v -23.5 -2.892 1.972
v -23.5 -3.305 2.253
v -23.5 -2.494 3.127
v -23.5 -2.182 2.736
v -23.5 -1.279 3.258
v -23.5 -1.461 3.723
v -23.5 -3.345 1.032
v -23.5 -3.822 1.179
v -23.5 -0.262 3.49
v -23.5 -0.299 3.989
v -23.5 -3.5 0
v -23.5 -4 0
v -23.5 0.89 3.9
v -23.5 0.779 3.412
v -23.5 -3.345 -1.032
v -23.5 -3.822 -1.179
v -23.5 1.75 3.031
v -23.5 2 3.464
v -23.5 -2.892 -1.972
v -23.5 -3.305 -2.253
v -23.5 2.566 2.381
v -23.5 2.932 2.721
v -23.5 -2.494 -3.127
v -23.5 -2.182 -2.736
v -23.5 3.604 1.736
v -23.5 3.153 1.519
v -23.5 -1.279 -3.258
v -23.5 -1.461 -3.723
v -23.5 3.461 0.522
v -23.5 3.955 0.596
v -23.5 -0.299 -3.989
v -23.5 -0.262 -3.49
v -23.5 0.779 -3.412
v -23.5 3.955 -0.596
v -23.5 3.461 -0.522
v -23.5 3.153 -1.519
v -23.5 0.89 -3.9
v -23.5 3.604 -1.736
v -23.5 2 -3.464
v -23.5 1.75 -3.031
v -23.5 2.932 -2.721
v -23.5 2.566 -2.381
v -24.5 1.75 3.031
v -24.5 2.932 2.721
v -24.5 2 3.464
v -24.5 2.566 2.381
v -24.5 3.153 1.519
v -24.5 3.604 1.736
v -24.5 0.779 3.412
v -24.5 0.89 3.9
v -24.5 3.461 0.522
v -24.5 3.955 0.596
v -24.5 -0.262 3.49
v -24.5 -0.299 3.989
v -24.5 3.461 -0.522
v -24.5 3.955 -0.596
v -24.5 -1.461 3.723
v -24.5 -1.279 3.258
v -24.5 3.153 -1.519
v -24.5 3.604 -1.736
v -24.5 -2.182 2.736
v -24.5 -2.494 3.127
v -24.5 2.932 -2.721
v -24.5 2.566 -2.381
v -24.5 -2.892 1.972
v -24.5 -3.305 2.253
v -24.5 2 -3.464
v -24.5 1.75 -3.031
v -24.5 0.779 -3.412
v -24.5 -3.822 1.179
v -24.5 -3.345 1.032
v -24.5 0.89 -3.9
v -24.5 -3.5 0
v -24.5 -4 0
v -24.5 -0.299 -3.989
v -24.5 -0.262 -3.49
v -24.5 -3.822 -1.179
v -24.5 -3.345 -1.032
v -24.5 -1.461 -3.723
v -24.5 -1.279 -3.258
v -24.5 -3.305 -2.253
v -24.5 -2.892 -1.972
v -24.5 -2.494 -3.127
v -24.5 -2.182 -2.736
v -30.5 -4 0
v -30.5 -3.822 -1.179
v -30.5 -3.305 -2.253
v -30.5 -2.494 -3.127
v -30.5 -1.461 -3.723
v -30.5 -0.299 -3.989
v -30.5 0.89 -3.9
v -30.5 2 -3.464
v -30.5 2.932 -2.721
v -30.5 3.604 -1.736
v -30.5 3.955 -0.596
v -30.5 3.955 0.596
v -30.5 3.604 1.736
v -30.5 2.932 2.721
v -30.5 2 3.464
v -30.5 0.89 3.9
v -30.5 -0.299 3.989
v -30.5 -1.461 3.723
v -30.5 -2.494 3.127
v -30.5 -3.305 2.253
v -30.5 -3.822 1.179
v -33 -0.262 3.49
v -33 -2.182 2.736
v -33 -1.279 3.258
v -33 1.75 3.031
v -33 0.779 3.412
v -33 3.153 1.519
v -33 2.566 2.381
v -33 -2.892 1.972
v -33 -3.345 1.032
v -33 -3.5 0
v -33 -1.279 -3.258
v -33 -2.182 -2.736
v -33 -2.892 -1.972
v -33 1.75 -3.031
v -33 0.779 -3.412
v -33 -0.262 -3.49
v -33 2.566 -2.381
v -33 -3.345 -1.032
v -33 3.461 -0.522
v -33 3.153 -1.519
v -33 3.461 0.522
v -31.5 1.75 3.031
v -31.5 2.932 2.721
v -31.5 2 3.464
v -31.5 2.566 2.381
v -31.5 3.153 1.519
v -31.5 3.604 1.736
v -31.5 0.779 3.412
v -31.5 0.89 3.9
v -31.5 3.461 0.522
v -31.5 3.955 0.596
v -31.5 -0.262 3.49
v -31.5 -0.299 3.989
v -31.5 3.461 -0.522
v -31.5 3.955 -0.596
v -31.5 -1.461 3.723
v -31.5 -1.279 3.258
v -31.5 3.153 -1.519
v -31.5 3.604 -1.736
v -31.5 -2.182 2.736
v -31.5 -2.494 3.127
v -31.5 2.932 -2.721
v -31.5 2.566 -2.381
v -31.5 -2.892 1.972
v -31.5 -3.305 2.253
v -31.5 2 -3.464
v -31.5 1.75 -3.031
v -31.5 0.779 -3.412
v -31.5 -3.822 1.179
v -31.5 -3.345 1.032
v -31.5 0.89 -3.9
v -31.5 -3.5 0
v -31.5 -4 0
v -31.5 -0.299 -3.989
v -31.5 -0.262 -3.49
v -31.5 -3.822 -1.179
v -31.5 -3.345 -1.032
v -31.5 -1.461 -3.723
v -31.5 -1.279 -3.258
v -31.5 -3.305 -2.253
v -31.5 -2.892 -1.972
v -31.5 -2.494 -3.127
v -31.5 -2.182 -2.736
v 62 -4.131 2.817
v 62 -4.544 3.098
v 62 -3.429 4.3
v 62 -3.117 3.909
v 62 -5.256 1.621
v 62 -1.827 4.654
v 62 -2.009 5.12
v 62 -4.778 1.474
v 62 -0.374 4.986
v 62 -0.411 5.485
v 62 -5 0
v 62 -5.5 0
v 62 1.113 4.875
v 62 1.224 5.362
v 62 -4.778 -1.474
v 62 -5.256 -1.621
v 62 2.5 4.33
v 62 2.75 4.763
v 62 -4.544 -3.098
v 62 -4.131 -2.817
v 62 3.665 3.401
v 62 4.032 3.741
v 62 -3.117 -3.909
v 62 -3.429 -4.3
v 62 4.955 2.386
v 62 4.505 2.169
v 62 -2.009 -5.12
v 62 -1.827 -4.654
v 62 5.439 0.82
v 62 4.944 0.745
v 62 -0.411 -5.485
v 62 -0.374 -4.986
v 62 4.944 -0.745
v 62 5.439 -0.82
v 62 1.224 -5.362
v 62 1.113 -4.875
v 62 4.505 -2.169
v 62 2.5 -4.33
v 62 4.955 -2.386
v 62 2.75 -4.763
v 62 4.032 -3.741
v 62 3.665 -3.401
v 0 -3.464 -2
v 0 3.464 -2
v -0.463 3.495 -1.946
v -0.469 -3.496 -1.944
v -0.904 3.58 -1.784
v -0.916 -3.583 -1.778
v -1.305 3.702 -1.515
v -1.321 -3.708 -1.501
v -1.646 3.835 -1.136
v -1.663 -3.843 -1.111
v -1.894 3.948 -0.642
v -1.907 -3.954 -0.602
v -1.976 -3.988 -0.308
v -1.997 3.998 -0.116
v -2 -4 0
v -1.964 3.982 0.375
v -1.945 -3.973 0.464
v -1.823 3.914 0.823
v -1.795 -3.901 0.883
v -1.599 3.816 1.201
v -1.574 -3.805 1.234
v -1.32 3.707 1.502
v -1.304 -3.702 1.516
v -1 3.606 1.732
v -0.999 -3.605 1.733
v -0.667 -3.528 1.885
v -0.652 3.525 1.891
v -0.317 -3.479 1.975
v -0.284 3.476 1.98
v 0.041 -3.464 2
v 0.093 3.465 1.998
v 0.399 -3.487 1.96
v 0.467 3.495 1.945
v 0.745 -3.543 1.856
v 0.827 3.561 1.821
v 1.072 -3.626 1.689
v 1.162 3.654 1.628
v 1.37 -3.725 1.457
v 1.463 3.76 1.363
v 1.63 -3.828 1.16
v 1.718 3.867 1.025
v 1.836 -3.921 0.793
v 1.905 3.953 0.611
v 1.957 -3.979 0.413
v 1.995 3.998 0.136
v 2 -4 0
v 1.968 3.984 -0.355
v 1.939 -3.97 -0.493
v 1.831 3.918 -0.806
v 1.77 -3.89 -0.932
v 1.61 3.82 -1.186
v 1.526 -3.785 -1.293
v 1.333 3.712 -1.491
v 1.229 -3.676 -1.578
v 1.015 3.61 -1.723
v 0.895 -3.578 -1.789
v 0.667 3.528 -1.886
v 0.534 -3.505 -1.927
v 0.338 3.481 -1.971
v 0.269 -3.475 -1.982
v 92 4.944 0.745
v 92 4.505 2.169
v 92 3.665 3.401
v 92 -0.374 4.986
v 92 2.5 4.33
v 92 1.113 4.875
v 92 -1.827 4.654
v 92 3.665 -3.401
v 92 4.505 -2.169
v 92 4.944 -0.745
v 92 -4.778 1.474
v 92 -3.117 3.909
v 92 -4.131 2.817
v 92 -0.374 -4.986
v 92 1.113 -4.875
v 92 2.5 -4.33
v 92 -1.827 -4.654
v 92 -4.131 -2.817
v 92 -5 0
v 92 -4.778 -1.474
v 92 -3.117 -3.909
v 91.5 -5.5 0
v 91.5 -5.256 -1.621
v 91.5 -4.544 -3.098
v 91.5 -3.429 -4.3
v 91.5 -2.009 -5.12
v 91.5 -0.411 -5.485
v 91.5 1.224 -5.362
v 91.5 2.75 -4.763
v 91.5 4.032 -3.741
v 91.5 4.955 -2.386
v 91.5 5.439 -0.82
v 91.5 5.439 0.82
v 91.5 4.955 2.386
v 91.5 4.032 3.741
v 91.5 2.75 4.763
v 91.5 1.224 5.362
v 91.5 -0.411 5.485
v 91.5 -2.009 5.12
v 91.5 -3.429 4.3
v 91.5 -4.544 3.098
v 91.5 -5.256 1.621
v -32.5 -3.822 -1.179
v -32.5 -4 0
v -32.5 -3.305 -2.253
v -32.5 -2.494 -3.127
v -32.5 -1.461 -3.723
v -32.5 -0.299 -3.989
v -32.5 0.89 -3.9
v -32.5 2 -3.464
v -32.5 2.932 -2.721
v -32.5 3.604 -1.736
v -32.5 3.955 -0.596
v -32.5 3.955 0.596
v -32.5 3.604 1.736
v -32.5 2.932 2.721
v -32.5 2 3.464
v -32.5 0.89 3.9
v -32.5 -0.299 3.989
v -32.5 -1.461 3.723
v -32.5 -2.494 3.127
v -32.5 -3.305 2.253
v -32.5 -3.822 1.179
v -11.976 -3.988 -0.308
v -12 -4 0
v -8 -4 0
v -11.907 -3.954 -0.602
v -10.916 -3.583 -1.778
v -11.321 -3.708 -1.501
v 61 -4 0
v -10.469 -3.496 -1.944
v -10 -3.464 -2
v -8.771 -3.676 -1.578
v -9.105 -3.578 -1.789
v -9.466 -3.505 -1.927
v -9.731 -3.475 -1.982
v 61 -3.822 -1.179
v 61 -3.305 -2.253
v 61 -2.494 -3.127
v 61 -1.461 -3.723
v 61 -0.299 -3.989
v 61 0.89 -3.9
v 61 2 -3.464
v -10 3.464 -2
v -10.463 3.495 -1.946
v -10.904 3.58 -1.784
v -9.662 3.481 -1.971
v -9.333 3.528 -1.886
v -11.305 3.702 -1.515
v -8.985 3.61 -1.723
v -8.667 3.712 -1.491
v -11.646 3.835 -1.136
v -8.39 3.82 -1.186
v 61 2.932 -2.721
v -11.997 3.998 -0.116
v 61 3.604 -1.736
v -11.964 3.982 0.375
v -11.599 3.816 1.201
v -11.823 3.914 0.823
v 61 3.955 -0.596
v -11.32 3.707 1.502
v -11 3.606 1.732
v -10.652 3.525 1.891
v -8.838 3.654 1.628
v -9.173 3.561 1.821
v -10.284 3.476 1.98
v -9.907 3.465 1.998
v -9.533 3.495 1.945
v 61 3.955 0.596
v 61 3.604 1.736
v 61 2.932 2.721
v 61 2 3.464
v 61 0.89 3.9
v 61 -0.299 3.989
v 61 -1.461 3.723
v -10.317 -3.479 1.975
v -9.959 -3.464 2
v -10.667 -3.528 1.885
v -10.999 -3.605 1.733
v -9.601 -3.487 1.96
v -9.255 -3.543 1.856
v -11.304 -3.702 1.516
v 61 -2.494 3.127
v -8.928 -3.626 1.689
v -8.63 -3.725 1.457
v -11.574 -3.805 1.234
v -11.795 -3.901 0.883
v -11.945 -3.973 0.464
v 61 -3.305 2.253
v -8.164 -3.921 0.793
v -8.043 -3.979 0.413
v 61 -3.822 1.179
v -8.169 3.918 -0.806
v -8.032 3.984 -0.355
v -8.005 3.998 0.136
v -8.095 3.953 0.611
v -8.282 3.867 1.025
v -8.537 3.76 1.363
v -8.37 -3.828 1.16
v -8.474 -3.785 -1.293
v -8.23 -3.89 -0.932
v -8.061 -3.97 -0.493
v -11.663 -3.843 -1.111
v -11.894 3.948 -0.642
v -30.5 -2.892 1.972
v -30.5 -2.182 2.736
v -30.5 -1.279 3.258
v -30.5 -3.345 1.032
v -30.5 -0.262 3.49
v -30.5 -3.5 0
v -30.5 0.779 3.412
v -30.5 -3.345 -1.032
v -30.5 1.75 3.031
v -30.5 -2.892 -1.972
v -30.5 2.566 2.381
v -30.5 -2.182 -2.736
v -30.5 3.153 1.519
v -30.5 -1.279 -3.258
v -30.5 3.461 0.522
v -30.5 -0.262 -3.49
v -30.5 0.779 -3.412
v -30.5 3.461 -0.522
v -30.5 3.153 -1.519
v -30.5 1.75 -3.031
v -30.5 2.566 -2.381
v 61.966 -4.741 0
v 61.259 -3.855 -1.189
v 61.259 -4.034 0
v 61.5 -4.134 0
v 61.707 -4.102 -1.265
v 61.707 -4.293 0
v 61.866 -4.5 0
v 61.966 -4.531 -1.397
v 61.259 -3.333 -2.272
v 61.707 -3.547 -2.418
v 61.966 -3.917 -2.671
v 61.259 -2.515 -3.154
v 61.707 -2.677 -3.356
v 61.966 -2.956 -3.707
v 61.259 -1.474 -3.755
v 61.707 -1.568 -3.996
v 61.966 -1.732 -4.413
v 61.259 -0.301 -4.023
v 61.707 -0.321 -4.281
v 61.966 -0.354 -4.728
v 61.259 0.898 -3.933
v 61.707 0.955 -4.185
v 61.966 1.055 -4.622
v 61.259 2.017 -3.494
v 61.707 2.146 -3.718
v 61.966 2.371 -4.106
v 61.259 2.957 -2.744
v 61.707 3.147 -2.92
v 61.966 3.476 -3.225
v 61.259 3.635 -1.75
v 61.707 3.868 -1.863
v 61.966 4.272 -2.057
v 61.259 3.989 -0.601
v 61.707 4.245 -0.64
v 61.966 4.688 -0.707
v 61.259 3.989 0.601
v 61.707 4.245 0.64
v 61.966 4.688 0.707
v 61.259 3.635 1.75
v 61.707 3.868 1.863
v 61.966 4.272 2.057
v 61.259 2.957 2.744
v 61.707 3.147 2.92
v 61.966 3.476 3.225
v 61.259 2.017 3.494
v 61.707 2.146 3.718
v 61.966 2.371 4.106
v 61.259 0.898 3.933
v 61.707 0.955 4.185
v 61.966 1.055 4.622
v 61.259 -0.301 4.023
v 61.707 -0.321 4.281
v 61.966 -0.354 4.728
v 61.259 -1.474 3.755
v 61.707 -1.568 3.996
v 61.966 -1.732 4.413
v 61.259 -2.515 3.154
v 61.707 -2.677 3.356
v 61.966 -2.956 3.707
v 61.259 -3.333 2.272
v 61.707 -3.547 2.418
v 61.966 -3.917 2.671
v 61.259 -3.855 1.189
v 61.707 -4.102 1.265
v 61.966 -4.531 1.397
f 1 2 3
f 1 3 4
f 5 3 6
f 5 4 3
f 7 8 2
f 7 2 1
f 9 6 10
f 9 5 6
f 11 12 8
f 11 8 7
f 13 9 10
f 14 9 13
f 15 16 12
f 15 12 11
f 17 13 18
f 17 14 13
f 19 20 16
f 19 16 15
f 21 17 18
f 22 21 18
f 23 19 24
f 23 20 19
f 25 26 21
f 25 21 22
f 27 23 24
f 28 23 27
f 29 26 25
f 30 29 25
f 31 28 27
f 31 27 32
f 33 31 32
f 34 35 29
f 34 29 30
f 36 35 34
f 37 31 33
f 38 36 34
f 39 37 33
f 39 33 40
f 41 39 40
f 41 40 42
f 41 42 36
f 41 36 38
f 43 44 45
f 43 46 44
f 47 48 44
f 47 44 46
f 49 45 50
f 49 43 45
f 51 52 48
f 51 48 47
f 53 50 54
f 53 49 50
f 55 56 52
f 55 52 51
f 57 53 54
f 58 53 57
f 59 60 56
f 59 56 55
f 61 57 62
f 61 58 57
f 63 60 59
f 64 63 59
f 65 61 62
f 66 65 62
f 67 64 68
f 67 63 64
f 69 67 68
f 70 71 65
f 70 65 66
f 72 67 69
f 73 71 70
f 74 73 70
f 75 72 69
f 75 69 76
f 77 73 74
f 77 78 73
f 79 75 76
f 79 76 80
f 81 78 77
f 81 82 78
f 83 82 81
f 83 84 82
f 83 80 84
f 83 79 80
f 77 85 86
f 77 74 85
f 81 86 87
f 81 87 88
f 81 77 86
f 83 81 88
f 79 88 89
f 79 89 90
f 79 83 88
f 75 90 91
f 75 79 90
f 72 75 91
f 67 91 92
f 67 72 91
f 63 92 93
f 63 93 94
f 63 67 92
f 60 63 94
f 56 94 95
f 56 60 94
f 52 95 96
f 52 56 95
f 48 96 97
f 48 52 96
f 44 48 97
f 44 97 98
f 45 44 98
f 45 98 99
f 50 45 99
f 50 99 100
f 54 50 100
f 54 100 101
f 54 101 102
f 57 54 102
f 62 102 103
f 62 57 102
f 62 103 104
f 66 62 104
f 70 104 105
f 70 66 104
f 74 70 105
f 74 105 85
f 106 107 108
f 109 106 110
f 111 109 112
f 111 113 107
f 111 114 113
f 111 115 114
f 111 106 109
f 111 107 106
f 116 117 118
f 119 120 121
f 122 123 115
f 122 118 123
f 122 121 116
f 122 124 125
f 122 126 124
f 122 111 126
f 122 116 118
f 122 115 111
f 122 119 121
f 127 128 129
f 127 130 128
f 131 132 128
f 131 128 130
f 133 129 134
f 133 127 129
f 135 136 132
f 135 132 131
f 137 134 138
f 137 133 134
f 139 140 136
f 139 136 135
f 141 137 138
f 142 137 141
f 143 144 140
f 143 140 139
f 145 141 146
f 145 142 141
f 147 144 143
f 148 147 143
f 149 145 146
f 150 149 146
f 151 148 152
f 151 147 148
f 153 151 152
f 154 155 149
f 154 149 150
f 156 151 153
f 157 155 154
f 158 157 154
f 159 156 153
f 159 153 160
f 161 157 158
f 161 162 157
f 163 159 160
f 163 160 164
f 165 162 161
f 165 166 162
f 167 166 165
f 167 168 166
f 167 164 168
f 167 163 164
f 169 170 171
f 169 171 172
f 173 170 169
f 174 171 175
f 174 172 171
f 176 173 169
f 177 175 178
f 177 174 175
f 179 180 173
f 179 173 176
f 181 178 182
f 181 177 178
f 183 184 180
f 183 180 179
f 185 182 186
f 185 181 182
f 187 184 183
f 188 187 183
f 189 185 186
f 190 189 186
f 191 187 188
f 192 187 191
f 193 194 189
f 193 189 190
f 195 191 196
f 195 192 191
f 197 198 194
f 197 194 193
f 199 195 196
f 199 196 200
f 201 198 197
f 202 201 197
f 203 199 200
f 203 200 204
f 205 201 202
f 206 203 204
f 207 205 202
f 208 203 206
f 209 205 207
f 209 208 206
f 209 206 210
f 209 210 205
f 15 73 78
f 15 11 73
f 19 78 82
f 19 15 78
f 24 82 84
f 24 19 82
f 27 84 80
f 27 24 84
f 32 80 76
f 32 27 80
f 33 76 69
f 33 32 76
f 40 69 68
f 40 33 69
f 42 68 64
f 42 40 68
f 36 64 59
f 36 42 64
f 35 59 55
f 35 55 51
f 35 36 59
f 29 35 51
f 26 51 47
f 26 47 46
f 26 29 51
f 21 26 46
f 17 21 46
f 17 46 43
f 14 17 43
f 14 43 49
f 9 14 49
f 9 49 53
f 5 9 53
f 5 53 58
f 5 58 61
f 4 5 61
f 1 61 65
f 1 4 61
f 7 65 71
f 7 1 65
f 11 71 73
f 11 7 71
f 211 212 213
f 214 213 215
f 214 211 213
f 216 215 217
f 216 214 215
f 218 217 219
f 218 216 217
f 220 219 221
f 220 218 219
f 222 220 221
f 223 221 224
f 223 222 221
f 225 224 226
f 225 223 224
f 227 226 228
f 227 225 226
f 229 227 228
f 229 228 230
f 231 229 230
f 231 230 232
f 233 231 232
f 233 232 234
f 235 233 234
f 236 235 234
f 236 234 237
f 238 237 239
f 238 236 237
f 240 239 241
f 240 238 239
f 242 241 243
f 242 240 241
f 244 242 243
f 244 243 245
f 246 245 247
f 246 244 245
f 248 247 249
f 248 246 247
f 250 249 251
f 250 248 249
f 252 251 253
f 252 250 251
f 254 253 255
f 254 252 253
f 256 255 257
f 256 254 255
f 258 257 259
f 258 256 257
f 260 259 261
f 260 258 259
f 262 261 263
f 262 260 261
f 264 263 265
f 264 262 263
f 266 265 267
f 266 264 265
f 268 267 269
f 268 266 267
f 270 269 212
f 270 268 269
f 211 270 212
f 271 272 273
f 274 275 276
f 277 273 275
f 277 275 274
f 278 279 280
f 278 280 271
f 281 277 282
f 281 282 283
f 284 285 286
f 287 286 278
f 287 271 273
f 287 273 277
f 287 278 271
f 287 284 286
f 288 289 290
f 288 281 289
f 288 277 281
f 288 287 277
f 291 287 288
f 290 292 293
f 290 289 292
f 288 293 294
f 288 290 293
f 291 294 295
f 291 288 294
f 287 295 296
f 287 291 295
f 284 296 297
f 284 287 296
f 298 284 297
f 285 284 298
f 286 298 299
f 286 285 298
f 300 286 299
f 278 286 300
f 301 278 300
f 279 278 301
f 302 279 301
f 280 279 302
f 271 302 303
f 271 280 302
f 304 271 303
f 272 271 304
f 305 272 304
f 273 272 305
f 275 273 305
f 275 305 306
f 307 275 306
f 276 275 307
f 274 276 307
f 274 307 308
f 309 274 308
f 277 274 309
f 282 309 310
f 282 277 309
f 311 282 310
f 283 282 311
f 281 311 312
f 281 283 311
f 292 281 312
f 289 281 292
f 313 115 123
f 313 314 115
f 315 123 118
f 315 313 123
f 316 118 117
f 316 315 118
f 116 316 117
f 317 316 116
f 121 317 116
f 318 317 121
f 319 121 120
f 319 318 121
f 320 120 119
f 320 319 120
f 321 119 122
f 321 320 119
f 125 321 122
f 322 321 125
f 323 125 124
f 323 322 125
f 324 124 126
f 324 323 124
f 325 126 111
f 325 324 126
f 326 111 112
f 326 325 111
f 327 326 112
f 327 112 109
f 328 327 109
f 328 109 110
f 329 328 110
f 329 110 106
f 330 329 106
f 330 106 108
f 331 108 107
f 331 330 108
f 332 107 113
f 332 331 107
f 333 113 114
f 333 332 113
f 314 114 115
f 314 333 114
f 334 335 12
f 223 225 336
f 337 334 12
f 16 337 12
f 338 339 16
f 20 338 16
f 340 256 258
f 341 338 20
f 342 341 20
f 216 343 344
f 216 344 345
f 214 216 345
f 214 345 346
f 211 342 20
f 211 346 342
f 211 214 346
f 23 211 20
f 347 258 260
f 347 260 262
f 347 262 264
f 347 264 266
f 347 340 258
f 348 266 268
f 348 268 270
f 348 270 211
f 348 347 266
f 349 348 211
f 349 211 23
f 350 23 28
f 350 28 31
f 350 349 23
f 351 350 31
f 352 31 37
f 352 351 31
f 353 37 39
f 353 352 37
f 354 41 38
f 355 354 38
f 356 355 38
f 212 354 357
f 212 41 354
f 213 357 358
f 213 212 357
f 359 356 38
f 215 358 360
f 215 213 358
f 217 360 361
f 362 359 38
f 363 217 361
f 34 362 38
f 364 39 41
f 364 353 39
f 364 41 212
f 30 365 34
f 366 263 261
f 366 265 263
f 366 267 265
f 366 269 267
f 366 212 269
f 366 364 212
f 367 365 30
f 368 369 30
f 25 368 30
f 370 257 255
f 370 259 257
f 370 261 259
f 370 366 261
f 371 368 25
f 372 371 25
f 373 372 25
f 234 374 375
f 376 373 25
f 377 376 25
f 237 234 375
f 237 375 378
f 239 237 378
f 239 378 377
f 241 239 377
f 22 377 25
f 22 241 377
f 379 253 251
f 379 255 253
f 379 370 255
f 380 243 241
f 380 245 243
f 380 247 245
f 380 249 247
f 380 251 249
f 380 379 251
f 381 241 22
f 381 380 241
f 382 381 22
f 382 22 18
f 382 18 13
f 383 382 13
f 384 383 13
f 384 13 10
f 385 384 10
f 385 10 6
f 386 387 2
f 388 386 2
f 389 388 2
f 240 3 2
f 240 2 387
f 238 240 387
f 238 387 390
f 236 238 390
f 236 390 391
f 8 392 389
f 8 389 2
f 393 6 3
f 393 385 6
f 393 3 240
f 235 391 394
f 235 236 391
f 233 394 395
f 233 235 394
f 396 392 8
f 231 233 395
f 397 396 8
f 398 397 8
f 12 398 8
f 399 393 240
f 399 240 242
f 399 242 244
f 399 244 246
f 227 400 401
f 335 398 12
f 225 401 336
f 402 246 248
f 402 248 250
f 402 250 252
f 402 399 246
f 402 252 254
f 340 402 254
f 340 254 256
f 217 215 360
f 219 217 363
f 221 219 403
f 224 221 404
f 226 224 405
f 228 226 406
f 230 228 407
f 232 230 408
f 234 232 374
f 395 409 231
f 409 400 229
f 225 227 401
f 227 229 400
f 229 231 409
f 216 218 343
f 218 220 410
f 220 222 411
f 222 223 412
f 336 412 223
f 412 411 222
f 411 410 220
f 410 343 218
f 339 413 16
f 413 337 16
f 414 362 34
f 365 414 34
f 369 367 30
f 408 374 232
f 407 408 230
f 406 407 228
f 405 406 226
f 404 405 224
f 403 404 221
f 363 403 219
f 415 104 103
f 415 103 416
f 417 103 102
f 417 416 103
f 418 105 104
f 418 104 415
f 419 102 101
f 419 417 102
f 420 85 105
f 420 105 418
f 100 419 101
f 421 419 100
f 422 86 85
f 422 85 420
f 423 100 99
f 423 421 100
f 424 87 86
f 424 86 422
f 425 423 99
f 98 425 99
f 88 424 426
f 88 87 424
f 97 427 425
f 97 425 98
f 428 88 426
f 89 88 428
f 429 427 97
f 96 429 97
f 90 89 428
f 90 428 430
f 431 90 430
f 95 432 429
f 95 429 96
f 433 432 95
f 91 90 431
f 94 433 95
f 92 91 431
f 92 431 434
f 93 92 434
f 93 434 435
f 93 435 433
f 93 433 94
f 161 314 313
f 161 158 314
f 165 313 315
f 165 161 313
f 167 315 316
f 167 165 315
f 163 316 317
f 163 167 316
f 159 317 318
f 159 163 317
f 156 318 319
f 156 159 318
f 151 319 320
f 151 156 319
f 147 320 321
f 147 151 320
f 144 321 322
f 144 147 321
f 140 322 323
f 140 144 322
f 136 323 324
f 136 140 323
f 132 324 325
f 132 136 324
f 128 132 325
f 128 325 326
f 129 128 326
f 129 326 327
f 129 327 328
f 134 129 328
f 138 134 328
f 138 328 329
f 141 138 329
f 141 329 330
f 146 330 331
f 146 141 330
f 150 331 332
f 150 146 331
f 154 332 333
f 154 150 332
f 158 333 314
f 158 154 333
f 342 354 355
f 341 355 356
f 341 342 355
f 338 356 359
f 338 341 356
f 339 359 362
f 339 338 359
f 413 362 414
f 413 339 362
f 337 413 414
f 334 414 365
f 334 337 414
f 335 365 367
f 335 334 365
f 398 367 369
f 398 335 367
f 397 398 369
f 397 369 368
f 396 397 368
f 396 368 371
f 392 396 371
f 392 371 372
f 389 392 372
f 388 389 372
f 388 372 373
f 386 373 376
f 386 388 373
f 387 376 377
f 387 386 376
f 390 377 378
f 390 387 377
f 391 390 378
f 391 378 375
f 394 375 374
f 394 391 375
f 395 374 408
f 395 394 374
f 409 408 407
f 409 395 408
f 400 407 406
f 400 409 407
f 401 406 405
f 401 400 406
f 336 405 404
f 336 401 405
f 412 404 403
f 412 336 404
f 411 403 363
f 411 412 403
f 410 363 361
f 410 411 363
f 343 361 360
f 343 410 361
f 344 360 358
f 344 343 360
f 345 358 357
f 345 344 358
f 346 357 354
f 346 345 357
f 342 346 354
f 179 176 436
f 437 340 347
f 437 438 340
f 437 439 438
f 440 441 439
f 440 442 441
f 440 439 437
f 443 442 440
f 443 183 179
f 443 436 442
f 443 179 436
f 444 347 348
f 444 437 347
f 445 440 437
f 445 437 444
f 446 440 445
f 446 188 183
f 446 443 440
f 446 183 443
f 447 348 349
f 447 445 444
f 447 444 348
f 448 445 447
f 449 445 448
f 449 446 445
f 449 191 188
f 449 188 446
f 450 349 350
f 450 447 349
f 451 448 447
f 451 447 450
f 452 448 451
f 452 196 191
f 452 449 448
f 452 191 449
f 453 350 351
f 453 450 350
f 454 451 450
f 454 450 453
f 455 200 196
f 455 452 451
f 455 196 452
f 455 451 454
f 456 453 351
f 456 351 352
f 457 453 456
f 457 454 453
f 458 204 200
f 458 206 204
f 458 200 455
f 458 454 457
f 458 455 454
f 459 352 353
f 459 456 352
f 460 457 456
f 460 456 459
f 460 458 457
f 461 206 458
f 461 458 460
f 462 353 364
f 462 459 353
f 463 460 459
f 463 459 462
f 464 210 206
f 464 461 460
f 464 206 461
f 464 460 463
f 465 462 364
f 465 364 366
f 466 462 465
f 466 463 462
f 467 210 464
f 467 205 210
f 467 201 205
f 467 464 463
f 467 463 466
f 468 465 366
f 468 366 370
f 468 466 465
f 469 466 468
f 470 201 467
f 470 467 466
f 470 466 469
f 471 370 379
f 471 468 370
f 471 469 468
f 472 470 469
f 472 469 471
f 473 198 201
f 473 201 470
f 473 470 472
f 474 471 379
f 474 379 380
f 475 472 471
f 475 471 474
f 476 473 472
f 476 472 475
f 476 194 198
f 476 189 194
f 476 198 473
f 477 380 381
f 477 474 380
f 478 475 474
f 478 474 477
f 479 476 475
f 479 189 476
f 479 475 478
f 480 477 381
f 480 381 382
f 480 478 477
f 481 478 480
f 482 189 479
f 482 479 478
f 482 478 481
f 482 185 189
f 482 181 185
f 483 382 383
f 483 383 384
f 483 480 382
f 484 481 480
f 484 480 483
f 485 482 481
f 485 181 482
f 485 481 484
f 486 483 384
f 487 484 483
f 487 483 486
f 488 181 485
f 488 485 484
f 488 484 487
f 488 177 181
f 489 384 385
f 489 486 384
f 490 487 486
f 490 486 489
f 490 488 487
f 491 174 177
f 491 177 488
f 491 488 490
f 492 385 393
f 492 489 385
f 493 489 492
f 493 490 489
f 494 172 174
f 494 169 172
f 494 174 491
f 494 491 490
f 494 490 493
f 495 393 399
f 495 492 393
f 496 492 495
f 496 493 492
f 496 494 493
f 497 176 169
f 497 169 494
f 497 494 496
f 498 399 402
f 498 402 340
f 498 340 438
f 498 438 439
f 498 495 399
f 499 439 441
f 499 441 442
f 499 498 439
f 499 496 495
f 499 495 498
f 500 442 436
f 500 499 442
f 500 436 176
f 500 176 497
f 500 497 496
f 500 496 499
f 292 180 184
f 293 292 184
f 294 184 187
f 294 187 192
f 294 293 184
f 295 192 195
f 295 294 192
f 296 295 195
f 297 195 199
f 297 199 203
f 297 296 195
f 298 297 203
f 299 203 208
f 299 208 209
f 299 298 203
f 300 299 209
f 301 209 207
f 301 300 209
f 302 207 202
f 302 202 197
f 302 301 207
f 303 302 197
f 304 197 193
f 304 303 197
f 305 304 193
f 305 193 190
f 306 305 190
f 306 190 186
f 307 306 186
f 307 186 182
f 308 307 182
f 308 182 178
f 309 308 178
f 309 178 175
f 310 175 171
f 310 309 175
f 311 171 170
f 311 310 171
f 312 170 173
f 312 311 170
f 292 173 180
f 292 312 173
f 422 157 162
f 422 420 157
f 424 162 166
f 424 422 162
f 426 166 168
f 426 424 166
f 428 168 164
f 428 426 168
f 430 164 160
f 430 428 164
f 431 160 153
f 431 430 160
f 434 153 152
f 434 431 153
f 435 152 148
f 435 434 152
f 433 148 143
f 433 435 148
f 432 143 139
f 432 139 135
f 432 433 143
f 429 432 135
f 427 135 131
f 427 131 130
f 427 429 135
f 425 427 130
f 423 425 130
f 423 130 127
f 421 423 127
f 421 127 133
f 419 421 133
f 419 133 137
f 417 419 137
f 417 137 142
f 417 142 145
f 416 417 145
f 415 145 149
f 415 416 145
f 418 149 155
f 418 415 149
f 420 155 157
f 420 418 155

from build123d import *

# Parameters (mm, degrees)
CUT_EXTRUDE_1_DEPTH      = 10
CUT_EXTRUDE_1_DEPTH_BACK = 10
SKETCH_2_R               = 2


with BuildPart() as part:
    # 草图1 → 旋转1 (revolve)
    with BuildSketch(Plane.XY):
        with BuildLine():
            Line((-32.999870063, 0), (-32.999870063, 3.5))
            Line((-32.999870063, 3.5), (-32.499870063, 4))
            Line((-32.499870063, 4), (-31.499870063, 4))
            Line((-31.499870063, 4), (-31.499870063, 3.5))
            Line((-31.499870063, 3.5), (-30.499870063, 3.5))
            Line((-30.499870063, 3.5), (-30.499870063, 4))
            Line((-30.499870063, 4), (-24.499870063, 4))
            Line((-24.499870063, 4), (-24.499870063, 3.5))
            Line((-24.499870063, 3.5), (-23.499870063, 3.5))
            Line((-23.499870063, 3.5), (-23.499870063, 4))
            Line((-23.499870063, 4), (61, 4))
            ThreePointArc((61, 4), (61.707106781, 4.292893219), (62, 5))
            Line((62, 5), (62, 5.5))
            Line((62, 5.5), (91.5, 5.5))
            Line((91.5, 5.5), (92, 5))
            Line((92, 5), (92, 0))
            Line((92, 0), (-32.999870063, 0))
        make_face()
    revolve(axis=Axis((-32.999870063, 0, 0), (1, 0, 0)))

    # 草图2 → 切除-拉伸1 (cut, two sides: drawn at the far end of the back side and taken through both)
    with BuildSketch(Plane(origin=(0, 0, 0), x_dir=(1, 0, 0), z_dir=(0, 1, 0)).offset(-CUT_EXTRUDE_1_DEPTH_BACK)):
        with Locations((-9.999870063, 0)):
            Circle(SKETCH_2_R)
        with Locations((0.000129937, 0)):
            Circle(SKETCH_2_R)
    extrude(amount=CUT_EXTRUDE_1_DEPTH + CUT_EXTRUDE_1_DEPTH_BACK, mode=Mode.SUBTRACT)


solid = part.part
